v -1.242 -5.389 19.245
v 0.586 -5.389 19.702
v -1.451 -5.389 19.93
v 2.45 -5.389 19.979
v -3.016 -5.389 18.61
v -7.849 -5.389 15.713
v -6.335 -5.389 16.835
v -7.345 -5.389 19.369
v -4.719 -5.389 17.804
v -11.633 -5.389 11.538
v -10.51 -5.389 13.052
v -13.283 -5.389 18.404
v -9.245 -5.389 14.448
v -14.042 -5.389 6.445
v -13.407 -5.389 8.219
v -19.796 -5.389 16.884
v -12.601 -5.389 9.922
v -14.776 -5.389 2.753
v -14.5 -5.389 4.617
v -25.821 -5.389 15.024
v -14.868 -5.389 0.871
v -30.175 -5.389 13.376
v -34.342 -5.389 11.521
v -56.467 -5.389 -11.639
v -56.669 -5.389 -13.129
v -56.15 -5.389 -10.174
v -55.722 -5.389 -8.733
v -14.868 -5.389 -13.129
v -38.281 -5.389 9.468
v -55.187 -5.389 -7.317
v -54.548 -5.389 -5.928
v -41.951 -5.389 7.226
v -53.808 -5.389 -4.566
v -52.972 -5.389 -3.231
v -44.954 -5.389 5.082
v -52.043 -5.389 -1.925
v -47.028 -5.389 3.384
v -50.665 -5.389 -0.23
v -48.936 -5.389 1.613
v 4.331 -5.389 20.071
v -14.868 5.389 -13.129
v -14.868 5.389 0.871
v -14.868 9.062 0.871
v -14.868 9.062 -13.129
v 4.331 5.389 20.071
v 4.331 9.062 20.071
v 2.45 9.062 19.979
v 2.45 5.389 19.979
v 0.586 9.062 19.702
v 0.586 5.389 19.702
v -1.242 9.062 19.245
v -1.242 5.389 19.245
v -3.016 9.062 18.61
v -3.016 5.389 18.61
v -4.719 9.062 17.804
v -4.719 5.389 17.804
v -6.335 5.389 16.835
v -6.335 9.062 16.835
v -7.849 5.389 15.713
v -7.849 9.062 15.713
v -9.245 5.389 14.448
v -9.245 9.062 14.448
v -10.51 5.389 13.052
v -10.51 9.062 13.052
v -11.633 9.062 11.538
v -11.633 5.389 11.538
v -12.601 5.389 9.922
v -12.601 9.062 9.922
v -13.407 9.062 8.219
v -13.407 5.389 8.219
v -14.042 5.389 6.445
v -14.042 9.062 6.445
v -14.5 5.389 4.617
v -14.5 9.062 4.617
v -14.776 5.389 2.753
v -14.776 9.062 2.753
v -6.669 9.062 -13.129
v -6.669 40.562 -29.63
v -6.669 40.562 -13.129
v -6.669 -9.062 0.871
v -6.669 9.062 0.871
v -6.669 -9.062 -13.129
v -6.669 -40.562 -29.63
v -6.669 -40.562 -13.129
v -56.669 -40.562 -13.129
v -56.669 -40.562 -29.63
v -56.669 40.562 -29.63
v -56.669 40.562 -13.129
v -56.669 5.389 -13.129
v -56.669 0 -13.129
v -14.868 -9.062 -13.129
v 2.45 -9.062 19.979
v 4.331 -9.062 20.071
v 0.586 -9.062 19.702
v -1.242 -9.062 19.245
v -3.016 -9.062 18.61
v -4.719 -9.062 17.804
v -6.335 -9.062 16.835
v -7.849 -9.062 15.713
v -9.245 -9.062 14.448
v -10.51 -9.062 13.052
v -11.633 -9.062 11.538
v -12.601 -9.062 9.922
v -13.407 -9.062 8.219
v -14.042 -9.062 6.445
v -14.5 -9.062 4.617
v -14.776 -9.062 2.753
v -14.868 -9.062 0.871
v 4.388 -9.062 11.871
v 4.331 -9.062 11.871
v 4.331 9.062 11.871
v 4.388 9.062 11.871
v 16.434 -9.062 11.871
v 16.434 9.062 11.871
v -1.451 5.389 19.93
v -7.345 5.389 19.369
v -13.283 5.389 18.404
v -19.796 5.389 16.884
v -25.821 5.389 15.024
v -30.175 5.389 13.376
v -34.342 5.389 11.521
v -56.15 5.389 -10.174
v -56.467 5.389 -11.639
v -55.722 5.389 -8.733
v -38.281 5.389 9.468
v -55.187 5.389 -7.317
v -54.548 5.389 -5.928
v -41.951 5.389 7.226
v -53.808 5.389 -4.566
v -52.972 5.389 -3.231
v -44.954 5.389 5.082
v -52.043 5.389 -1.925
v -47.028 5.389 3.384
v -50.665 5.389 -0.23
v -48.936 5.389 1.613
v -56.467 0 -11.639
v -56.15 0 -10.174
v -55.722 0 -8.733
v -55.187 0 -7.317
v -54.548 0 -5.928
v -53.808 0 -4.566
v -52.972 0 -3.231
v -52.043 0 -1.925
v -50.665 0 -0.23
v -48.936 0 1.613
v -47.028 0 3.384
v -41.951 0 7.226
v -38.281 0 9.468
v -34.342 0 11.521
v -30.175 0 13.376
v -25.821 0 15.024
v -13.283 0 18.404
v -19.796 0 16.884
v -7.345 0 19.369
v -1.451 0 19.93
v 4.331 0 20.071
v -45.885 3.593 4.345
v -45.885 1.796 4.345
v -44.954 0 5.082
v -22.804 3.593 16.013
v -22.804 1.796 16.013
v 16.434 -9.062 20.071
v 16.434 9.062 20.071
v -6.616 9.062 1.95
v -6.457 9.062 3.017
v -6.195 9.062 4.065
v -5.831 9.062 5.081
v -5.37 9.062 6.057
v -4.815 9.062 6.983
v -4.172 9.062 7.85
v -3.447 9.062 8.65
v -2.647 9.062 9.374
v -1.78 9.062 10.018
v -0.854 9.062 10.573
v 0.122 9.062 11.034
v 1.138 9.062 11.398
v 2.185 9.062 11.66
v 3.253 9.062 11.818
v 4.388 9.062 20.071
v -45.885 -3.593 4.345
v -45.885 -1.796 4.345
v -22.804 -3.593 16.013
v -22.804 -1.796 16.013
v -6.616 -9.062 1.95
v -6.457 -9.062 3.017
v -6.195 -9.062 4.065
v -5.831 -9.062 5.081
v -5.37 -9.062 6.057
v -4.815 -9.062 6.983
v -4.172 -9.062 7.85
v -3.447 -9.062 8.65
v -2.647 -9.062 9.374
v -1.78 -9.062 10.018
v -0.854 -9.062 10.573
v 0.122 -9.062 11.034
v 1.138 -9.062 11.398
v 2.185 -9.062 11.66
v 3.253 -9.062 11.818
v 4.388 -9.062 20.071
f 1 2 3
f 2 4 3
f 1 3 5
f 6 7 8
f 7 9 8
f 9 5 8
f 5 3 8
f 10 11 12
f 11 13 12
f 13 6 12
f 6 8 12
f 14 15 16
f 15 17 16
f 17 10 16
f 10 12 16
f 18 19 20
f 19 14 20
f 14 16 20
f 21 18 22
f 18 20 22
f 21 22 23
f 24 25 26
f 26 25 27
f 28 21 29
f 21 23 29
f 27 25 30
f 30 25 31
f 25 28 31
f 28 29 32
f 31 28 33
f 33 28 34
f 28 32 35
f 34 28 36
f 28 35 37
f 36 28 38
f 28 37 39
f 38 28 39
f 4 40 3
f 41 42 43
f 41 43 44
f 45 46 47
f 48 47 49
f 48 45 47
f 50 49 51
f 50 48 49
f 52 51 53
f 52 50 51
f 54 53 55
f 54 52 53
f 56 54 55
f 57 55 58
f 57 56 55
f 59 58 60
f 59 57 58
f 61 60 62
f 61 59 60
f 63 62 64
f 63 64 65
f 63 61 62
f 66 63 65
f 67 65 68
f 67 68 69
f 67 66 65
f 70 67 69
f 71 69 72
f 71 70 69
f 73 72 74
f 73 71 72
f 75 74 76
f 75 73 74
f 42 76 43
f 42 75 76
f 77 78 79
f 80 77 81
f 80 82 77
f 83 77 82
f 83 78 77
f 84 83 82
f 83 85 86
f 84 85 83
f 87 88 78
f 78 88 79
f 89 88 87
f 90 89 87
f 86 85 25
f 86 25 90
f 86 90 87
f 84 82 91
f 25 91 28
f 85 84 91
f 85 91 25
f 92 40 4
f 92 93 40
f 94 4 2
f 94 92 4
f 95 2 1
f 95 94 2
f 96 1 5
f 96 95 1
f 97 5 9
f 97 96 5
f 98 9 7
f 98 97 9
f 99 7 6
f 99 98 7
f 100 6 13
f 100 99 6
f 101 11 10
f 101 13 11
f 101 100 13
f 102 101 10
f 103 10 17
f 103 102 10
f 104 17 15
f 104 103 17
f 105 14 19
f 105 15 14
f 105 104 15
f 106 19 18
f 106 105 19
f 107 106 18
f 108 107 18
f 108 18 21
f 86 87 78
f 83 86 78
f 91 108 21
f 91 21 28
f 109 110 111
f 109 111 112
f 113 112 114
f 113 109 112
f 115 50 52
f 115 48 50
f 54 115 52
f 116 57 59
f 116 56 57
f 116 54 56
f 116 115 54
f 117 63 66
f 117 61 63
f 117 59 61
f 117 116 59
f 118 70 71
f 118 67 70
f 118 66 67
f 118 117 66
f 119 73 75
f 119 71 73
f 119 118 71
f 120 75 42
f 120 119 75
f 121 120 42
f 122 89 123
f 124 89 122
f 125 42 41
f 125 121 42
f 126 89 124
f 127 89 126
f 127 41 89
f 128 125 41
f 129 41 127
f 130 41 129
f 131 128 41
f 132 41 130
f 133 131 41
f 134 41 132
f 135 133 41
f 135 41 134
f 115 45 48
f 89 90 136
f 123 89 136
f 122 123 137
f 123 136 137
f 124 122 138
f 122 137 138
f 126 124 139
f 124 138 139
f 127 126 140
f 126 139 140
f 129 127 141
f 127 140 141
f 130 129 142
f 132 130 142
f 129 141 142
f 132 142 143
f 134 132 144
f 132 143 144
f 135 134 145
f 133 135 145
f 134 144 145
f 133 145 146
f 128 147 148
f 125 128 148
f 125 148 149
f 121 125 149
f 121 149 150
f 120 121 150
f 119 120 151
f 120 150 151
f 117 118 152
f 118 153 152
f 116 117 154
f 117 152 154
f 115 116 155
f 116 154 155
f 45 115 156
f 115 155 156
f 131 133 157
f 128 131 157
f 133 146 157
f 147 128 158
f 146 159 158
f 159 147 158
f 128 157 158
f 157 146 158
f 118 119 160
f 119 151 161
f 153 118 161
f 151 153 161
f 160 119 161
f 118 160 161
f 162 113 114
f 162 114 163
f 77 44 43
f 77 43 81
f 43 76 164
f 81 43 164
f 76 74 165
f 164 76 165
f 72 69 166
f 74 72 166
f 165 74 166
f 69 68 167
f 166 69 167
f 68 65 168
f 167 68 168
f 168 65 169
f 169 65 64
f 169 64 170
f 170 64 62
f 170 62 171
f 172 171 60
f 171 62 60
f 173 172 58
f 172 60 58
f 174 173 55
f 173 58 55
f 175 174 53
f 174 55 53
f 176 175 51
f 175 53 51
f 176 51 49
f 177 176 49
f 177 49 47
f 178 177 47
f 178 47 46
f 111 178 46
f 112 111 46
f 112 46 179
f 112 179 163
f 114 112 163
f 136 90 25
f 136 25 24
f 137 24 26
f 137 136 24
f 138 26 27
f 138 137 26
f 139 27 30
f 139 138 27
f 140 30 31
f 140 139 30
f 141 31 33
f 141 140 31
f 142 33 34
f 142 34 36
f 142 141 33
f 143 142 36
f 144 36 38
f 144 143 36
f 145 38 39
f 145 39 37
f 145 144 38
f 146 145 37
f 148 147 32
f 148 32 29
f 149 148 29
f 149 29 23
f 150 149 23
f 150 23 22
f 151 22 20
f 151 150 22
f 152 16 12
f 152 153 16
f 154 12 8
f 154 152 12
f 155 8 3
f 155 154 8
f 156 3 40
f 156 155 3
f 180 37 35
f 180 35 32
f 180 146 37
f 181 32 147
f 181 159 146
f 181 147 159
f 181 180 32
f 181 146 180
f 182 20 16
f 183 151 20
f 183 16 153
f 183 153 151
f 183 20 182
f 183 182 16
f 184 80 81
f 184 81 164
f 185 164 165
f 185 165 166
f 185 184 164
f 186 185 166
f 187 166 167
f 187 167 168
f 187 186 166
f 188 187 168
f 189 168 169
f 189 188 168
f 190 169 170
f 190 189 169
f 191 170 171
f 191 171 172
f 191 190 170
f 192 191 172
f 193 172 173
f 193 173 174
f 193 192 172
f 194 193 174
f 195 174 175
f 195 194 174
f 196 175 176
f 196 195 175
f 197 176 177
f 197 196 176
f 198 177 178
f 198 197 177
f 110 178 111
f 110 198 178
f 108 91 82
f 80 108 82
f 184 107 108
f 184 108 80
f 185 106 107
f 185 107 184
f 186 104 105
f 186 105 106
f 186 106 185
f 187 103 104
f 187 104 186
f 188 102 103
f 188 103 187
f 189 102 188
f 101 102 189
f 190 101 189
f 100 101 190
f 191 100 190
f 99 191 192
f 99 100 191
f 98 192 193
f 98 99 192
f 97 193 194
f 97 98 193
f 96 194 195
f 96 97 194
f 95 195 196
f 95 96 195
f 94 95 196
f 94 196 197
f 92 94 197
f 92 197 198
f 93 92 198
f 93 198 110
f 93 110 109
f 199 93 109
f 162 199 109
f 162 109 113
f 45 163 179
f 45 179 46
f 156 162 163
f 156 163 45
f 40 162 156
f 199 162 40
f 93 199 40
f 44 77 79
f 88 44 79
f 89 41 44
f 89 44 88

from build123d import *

# Parameters (mm, degrees)
F1_DEPTH = 40.56158
F2_DEPTH = 5.38948
F0_W     = 12.0462047143
F0_H     = 8.1998697145
F3_DEPTH = 9.06237


with BuildPart() as f1:
    # F0 (on Front) → F1 (new body, symmetric)
    with BuildSketch(Plane.XZ):
        Polygon((-14.8684419692, -13.1286175627), (-56.6685722546, -13.1286175627), (-56.6685722546, -29.630266222), (-6.6685722546, -29.630266222), (-6.6685722546, -13.1286175627), align=None)
    extrude(amount=F1_DEPTH, both=True)

    # F0 (on Front) → F2 (join, symmetric)
    with BuildSketch(Plane.XZ):
        with BuildLine():
            add(Edge.make_bspline(
                [(-56.6685722546, -13.1286175627), (-54.7797419131, 6.6462885588), (-22.0853742212, 20.4196609557), (4.3314277454, 20.0712521518)],
                knots=[0, 0, 0, 0, 69.4494877523, 69.4494877523, 69.4494877523, 69.4494877523], degree=3))
            Line((-56.6685722546, -13.1286175627), (-14.8684419692, -13.1286175627))
            Line((-14.8684419692, -13.1286175627), (-14.8684419692, 0.8713824373))
            ThreePointArc((-14.8684419692, 0.8713824373), (-9.2449303277, 14.4477405103), (4.3314277454, 20.0712521518))
        make_face()
    extrude(amount=F2_DEPTH, both=True)

    # F0 (on Front) → F3 (join, symmetric)
    with BuildSketch(Plane.XZ):
        with BuildLine():
            Line((-14.8684419692, 0.8713824373), (-14.8684419692, -13.1286175627))
            Line((-14.8684419692, -13.1286175627), (-6.6685722546, -13.1286175627))
            Line((-6.6685722546, -13.1286175627), (-6.6685722546, 0.8713824373))
            ThreePointArc((-6.6685722546, 0.8713824373), (-3.4467468477, 8.6495570304), (4.3314277454, 11.8713824373))
            Line((4.3314277454, 11.8713824373), (4.3880510932, 11.8713824373))
            Line((4.3880510932, 11.8713824373), (4.3880510932, 20.0712521518))
            Line((4.3880510932, 20.0712521518), (4.3314277454, 20.0712521518))
            ThreePointArc((4.3314277454, 20.0712521518), (-9.2449303277, 14.4477405103), (-14.8684419692, 0.8713824373))
        make_face()
        with Locations((10.4111534504, 15.9713172946)):
            Rectangle(F0_W, F0_H)
    extrude(amount=F3_DEPTH, both=True)


solid = f1.part
